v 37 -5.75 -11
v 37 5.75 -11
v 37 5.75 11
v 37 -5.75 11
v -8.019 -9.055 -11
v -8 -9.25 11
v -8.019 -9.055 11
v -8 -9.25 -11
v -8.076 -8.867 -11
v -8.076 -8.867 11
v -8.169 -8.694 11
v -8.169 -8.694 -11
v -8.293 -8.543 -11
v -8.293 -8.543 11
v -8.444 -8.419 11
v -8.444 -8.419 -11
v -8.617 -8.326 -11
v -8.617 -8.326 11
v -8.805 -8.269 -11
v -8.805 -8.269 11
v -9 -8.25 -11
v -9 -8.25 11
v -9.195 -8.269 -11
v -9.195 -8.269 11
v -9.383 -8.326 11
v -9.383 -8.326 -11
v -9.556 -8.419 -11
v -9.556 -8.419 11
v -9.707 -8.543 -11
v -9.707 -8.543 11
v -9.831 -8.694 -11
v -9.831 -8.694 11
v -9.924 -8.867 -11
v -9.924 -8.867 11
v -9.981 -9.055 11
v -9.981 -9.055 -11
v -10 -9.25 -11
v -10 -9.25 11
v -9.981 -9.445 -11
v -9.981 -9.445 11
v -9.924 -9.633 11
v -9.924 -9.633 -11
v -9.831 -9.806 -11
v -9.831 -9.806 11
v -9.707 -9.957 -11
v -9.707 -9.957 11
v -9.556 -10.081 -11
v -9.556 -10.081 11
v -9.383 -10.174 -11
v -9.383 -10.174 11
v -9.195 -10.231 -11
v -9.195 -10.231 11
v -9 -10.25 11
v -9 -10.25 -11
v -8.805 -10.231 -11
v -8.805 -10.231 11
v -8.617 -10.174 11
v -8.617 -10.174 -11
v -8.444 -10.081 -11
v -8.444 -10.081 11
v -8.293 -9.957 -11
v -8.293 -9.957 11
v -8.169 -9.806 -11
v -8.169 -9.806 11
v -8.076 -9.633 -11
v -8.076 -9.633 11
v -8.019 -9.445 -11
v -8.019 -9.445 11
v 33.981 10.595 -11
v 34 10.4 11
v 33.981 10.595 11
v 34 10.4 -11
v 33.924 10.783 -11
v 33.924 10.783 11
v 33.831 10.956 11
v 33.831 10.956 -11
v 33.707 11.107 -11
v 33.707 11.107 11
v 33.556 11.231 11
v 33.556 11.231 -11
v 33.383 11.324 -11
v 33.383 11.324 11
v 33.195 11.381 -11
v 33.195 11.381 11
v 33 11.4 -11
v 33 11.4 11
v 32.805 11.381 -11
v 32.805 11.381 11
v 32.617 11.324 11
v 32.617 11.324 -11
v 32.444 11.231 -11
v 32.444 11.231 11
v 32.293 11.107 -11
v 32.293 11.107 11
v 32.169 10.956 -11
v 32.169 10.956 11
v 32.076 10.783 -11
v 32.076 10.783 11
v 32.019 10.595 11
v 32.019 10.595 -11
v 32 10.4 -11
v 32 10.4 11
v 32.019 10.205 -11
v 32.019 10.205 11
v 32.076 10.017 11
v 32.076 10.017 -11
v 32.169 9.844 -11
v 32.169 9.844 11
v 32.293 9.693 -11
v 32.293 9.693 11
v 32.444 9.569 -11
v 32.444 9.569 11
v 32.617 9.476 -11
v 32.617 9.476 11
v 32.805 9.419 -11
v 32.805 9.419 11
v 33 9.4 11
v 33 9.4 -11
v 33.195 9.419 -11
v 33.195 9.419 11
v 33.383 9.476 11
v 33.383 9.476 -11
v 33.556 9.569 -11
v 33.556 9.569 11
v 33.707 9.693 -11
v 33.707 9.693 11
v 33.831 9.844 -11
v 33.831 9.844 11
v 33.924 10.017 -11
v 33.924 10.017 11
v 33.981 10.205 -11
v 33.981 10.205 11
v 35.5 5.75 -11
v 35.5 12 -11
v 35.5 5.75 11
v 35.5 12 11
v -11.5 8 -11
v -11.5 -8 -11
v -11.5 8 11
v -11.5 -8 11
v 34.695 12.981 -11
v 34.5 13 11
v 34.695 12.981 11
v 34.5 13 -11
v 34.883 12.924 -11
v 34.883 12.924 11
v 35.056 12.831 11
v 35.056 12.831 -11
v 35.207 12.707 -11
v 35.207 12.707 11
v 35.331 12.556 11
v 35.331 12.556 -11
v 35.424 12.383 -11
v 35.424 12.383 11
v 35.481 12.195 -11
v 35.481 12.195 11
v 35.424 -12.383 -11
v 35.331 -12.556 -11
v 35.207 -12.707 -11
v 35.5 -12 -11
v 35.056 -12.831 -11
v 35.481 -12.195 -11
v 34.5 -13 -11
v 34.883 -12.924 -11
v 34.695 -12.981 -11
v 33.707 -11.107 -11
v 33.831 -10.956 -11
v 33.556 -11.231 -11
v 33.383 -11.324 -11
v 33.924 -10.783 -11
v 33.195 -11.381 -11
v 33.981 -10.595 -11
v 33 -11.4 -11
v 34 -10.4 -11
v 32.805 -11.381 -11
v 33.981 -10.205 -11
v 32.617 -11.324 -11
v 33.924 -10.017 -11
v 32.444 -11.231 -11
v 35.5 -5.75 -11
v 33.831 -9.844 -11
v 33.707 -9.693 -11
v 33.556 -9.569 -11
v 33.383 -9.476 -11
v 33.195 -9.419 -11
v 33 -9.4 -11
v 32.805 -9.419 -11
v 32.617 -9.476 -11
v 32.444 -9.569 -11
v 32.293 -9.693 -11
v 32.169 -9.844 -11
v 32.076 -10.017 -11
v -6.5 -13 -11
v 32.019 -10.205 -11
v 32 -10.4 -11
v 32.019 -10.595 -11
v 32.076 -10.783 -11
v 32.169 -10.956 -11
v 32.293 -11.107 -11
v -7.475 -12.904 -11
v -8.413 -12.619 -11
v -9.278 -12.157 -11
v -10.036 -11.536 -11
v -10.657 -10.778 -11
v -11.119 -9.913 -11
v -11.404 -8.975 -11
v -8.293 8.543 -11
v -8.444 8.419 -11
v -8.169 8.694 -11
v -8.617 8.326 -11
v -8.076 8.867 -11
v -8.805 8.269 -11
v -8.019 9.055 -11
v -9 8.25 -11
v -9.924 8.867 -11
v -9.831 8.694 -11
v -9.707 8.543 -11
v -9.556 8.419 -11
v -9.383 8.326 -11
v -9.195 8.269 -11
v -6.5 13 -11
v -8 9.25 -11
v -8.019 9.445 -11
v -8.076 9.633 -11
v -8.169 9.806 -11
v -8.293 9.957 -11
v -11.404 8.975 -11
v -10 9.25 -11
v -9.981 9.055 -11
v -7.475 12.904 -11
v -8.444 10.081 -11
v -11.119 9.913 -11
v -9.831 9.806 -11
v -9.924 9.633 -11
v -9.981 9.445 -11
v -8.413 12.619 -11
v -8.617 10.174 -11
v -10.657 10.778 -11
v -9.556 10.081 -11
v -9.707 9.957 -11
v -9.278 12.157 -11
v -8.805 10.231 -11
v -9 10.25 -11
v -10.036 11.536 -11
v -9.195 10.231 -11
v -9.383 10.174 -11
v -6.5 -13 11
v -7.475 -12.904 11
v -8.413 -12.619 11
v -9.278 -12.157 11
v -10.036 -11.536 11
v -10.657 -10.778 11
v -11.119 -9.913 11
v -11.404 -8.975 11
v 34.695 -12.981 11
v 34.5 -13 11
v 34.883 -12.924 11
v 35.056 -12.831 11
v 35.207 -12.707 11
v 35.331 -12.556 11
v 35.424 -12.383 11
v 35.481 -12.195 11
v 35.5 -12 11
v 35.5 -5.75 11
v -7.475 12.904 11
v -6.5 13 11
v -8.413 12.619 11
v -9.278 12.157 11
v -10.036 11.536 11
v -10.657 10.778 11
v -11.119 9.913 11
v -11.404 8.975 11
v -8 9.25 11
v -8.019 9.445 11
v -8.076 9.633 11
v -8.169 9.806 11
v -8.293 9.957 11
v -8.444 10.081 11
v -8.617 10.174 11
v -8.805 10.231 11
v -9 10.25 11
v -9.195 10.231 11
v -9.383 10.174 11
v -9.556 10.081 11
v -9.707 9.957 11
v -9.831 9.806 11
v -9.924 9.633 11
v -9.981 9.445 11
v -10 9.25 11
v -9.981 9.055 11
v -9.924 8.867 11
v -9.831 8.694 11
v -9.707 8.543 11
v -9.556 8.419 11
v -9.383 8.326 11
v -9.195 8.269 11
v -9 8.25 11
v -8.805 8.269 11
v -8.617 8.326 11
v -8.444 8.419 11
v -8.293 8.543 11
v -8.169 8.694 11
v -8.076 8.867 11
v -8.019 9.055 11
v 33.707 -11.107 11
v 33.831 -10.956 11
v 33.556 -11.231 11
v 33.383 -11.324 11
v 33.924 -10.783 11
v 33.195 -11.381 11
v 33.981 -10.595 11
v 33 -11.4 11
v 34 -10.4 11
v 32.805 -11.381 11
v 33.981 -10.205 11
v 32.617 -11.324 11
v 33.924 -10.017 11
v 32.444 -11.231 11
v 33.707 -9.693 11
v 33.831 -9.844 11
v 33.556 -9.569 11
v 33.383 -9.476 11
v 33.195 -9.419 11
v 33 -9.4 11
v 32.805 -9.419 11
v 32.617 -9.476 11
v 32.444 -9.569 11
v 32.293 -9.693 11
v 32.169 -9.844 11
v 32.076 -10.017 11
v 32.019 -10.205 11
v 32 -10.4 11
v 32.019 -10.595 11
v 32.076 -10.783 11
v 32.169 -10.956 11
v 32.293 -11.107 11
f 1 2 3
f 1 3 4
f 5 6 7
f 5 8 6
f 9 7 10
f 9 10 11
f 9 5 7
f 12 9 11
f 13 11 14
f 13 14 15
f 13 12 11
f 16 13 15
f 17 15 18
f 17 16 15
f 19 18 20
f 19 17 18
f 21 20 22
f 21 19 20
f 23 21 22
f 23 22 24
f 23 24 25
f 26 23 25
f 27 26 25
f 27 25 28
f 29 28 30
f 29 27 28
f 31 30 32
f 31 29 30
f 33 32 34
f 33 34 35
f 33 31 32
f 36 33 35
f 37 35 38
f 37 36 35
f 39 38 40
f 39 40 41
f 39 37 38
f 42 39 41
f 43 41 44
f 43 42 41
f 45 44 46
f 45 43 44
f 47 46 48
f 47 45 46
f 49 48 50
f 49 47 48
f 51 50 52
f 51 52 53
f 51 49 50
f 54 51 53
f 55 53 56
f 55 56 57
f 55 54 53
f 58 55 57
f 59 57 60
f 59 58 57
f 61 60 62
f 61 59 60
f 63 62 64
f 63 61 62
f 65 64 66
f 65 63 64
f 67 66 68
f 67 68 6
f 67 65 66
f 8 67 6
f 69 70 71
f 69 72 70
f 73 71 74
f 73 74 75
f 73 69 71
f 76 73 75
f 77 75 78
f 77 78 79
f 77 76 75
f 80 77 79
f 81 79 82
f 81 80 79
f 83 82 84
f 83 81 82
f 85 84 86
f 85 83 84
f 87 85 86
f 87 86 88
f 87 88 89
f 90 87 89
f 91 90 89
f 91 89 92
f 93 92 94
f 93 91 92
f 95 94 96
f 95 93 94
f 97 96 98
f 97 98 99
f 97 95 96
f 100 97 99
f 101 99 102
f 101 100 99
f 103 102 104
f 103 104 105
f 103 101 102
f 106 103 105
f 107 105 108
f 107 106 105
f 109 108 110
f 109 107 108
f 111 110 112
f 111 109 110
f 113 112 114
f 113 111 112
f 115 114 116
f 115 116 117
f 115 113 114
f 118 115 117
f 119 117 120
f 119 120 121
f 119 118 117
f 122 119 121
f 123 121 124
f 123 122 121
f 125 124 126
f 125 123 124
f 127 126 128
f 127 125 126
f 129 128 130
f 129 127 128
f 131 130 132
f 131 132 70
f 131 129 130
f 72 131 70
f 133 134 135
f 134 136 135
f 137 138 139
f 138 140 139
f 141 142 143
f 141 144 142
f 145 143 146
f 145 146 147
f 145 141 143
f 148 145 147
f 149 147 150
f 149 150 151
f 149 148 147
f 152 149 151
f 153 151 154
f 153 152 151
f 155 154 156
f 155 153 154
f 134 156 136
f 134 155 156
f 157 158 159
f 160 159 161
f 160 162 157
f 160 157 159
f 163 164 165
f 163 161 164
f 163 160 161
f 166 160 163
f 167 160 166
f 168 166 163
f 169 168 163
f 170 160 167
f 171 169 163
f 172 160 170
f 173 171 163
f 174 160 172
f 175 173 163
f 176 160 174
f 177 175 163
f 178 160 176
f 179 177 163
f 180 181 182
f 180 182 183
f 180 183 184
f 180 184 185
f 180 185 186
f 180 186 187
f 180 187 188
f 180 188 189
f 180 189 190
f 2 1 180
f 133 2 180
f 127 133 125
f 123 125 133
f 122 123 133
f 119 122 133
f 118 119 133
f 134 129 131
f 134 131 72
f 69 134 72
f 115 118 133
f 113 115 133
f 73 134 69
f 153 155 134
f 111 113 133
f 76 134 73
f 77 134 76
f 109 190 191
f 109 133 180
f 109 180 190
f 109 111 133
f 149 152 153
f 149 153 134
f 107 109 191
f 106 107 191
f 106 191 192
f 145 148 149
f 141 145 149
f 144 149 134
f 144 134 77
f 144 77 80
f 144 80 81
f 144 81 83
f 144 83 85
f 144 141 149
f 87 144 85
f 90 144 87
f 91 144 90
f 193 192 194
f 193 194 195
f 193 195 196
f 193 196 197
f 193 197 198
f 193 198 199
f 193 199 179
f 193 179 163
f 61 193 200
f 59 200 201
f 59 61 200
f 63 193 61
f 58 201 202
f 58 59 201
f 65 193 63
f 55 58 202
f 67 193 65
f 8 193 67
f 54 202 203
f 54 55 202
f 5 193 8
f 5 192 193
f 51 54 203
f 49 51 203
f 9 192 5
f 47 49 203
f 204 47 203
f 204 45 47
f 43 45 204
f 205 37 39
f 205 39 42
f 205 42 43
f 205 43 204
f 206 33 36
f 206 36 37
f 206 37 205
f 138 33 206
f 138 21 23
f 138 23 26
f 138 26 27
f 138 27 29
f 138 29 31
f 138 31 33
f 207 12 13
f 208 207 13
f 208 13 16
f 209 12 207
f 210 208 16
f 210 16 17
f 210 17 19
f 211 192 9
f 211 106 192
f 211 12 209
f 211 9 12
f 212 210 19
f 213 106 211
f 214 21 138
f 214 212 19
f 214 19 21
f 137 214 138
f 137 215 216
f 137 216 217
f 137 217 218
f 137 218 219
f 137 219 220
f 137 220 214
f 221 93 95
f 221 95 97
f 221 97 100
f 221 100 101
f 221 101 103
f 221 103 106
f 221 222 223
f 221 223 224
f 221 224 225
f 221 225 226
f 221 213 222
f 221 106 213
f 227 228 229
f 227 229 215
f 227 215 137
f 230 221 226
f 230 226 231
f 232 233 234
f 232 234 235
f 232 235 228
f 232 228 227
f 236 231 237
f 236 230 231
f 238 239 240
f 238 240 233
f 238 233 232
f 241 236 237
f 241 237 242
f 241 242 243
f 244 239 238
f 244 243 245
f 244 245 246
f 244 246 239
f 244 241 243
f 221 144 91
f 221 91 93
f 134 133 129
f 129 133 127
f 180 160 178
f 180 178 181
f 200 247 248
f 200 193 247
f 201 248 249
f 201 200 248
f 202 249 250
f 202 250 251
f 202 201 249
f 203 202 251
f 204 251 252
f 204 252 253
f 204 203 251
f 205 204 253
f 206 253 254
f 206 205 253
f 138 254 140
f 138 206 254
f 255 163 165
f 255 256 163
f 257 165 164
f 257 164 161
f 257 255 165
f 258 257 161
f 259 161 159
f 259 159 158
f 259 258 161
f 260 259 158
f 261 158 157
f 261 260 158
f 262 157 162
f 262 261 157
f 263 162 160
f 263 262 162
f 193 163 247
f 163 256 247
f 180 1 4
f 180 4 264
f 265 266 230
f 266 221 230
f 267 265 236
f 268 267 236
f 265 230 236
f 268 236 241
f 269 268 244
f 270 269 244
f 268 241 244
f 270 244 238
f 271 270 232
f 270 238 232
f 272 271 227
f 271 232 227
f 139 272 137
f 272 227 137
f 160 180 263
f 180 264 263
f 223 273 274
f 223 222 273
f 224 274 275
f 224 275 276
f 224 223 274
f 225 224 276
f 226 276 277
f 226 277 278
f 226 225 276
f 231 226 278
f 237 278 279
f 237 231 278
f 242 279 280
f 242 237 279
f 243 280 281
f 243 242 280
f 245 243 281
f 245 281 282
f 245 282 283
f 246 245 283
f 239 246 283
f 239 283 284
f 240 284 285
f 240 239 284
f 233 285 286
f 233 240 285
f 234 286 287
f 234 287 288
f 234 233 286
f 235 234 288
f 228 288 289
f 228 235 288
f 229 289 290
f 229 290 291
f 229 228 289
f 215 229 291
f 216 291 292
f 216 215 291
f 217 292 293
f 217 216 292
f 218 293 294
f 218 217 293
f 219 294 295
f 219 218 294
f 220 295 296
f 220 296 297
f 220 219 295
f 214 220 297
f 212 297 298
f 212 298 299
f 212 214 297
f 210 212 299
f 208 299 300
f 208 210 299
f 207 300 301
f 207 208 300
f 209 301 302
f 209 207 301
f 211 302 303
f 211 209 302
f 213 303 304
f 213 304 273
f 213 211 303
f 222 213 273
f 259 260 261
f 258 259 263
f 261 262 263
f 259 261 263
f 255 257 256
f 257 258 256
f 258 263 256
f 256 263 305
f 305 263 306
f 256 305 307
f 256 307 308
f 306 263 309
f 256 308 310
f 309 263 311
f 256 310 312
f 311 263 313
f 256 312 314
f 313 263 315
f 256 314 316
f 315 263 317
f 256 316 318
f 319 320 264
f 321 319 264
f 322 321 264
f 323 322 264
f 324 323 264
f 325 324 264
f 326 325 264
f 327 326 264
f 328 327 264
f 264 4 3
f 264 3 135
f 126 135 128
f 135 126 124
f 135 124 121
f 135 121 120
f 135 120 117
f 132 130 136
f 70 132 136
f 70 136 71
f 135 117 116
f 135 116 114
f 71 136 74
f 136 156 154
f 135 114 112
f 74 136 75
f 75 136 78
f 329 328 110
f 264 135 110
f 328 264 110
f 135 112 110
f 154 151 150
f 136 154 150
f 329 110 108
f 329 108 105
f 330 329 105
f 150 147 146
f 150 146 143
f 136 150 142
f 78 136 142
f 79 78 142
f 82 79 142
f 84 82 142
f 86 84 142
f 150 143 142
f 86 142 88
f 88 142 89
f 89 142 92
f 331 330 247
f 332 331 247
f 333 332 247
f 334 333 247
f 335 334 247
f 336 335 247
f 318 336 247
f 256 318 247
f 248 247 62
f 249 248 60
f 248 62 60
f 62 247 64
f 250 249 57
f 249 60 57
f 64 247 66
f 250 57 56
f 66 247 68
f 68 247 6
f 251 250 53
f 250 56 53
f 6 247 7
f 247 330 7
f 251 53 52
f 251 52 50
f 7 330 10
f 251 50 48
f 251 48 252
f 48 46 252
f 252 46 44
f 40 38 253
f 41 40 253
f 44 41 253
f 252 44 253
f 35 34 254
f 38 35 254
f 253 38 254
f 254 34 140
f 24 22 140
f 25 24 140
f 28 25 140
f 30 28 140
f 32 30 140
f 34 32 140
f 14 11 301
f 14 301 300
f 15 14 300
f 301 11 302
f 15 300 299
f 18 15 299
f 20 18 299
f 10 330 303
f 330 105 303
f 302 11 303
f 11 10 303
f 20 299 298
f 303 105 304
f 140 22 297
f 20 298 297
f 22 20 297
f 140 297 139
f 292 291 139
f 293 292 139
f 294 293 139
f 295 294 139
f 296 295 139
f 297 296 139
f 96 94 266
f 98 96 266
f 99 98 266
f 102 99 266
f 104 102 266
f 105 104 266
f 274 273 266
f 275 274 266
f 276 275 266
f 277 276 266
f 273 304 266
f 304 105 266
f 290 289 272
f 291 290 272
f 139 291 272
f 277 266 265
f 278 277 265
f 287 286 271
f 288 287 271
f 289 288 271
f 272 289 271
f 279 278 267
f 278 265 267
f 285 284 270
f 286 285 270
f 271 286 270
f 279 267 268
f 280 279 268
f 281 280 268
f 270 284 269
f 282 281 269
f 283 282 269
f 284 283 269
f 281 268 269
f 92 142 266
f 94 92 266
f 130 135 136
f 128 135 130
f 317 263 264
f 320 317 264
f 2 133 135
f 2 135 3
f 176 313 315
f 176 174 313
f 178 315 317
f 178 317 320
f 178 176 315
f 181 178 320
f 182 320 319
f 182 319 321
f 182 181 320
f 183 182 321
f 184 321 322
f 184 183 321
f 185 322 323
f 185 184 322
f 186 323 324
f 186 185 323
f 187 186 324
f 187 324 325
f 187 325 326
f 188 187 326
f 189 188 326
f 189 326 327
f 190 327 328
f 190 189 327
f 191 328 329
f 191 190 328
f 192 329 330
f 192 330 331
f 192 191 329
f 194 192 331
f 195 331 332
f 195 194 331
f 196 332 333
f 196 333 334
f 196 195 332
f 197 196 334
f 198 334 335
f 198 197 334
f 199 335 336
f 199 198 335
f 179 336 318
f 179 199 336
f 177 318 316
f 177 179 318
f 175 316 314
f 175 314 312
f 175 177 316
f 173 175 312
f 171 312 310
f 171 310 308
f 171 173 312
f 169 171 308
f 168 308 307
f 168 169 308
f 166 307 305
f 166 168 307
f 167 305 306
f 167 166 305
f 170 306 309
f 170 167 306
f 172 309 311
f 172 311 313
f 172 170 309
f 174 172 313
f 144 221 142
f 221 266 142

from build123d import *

# Parameters (mm, degrees)
SKETCH1_R           = 1
BOSS_EXTRUDE1_DEPTH = 11
FILLET1_R           = 5
FILLET2_R           = 1


with BuildPart() as part:
    # Sketch1 → Boss-Extrude1 (new body, symmetric)
    with BuildSketch(Plane.XY):
        Polygon((35.5, -13), (-11.5, -13), (-11.5, 13), (35.5, 13), (35.5, 5.75), (37, 5.75), (37, -5.75), (35.5, -5.75), align=None)
        with Locations((-9, 9.25)):
            Circle(SKETCH1_R, mode=Mode.SUBTRACT)
        with Locations((33, 10.4)):
            Circle(SKETCH1_R, mode=Mode.SUBTRACT)
        with Locations((33, -10.4)):
            Circle(SKETCH1_R, mode=Mode.SUBTRACT)
        with Locations((-9, -9.25)):
            Circle(SKETCH1_R, mode=Mode.SUBTRACT)
    extrude(amount=BOSS_EXTRUDE1_DEPTH, both=True)

    # Fillet1
    fillet1_edges = [part.edges().sort_by_distance(p)[0] for p in [
        (-11.5, 13, 0),
        (-11.5, -13, 0),
    ]]
    fillet(fillet1_edges, radius=FILLET1_R)

    # Fillet2
    fillet2_edges = [part.edges().sort_by_distance(p)[0] for p in [
        (35.5, 13, 0),
        (35.5, -13, 0),
    ]]
    fillet(fillet2_edges, radius=FILLET2_R)


solid = part.part
